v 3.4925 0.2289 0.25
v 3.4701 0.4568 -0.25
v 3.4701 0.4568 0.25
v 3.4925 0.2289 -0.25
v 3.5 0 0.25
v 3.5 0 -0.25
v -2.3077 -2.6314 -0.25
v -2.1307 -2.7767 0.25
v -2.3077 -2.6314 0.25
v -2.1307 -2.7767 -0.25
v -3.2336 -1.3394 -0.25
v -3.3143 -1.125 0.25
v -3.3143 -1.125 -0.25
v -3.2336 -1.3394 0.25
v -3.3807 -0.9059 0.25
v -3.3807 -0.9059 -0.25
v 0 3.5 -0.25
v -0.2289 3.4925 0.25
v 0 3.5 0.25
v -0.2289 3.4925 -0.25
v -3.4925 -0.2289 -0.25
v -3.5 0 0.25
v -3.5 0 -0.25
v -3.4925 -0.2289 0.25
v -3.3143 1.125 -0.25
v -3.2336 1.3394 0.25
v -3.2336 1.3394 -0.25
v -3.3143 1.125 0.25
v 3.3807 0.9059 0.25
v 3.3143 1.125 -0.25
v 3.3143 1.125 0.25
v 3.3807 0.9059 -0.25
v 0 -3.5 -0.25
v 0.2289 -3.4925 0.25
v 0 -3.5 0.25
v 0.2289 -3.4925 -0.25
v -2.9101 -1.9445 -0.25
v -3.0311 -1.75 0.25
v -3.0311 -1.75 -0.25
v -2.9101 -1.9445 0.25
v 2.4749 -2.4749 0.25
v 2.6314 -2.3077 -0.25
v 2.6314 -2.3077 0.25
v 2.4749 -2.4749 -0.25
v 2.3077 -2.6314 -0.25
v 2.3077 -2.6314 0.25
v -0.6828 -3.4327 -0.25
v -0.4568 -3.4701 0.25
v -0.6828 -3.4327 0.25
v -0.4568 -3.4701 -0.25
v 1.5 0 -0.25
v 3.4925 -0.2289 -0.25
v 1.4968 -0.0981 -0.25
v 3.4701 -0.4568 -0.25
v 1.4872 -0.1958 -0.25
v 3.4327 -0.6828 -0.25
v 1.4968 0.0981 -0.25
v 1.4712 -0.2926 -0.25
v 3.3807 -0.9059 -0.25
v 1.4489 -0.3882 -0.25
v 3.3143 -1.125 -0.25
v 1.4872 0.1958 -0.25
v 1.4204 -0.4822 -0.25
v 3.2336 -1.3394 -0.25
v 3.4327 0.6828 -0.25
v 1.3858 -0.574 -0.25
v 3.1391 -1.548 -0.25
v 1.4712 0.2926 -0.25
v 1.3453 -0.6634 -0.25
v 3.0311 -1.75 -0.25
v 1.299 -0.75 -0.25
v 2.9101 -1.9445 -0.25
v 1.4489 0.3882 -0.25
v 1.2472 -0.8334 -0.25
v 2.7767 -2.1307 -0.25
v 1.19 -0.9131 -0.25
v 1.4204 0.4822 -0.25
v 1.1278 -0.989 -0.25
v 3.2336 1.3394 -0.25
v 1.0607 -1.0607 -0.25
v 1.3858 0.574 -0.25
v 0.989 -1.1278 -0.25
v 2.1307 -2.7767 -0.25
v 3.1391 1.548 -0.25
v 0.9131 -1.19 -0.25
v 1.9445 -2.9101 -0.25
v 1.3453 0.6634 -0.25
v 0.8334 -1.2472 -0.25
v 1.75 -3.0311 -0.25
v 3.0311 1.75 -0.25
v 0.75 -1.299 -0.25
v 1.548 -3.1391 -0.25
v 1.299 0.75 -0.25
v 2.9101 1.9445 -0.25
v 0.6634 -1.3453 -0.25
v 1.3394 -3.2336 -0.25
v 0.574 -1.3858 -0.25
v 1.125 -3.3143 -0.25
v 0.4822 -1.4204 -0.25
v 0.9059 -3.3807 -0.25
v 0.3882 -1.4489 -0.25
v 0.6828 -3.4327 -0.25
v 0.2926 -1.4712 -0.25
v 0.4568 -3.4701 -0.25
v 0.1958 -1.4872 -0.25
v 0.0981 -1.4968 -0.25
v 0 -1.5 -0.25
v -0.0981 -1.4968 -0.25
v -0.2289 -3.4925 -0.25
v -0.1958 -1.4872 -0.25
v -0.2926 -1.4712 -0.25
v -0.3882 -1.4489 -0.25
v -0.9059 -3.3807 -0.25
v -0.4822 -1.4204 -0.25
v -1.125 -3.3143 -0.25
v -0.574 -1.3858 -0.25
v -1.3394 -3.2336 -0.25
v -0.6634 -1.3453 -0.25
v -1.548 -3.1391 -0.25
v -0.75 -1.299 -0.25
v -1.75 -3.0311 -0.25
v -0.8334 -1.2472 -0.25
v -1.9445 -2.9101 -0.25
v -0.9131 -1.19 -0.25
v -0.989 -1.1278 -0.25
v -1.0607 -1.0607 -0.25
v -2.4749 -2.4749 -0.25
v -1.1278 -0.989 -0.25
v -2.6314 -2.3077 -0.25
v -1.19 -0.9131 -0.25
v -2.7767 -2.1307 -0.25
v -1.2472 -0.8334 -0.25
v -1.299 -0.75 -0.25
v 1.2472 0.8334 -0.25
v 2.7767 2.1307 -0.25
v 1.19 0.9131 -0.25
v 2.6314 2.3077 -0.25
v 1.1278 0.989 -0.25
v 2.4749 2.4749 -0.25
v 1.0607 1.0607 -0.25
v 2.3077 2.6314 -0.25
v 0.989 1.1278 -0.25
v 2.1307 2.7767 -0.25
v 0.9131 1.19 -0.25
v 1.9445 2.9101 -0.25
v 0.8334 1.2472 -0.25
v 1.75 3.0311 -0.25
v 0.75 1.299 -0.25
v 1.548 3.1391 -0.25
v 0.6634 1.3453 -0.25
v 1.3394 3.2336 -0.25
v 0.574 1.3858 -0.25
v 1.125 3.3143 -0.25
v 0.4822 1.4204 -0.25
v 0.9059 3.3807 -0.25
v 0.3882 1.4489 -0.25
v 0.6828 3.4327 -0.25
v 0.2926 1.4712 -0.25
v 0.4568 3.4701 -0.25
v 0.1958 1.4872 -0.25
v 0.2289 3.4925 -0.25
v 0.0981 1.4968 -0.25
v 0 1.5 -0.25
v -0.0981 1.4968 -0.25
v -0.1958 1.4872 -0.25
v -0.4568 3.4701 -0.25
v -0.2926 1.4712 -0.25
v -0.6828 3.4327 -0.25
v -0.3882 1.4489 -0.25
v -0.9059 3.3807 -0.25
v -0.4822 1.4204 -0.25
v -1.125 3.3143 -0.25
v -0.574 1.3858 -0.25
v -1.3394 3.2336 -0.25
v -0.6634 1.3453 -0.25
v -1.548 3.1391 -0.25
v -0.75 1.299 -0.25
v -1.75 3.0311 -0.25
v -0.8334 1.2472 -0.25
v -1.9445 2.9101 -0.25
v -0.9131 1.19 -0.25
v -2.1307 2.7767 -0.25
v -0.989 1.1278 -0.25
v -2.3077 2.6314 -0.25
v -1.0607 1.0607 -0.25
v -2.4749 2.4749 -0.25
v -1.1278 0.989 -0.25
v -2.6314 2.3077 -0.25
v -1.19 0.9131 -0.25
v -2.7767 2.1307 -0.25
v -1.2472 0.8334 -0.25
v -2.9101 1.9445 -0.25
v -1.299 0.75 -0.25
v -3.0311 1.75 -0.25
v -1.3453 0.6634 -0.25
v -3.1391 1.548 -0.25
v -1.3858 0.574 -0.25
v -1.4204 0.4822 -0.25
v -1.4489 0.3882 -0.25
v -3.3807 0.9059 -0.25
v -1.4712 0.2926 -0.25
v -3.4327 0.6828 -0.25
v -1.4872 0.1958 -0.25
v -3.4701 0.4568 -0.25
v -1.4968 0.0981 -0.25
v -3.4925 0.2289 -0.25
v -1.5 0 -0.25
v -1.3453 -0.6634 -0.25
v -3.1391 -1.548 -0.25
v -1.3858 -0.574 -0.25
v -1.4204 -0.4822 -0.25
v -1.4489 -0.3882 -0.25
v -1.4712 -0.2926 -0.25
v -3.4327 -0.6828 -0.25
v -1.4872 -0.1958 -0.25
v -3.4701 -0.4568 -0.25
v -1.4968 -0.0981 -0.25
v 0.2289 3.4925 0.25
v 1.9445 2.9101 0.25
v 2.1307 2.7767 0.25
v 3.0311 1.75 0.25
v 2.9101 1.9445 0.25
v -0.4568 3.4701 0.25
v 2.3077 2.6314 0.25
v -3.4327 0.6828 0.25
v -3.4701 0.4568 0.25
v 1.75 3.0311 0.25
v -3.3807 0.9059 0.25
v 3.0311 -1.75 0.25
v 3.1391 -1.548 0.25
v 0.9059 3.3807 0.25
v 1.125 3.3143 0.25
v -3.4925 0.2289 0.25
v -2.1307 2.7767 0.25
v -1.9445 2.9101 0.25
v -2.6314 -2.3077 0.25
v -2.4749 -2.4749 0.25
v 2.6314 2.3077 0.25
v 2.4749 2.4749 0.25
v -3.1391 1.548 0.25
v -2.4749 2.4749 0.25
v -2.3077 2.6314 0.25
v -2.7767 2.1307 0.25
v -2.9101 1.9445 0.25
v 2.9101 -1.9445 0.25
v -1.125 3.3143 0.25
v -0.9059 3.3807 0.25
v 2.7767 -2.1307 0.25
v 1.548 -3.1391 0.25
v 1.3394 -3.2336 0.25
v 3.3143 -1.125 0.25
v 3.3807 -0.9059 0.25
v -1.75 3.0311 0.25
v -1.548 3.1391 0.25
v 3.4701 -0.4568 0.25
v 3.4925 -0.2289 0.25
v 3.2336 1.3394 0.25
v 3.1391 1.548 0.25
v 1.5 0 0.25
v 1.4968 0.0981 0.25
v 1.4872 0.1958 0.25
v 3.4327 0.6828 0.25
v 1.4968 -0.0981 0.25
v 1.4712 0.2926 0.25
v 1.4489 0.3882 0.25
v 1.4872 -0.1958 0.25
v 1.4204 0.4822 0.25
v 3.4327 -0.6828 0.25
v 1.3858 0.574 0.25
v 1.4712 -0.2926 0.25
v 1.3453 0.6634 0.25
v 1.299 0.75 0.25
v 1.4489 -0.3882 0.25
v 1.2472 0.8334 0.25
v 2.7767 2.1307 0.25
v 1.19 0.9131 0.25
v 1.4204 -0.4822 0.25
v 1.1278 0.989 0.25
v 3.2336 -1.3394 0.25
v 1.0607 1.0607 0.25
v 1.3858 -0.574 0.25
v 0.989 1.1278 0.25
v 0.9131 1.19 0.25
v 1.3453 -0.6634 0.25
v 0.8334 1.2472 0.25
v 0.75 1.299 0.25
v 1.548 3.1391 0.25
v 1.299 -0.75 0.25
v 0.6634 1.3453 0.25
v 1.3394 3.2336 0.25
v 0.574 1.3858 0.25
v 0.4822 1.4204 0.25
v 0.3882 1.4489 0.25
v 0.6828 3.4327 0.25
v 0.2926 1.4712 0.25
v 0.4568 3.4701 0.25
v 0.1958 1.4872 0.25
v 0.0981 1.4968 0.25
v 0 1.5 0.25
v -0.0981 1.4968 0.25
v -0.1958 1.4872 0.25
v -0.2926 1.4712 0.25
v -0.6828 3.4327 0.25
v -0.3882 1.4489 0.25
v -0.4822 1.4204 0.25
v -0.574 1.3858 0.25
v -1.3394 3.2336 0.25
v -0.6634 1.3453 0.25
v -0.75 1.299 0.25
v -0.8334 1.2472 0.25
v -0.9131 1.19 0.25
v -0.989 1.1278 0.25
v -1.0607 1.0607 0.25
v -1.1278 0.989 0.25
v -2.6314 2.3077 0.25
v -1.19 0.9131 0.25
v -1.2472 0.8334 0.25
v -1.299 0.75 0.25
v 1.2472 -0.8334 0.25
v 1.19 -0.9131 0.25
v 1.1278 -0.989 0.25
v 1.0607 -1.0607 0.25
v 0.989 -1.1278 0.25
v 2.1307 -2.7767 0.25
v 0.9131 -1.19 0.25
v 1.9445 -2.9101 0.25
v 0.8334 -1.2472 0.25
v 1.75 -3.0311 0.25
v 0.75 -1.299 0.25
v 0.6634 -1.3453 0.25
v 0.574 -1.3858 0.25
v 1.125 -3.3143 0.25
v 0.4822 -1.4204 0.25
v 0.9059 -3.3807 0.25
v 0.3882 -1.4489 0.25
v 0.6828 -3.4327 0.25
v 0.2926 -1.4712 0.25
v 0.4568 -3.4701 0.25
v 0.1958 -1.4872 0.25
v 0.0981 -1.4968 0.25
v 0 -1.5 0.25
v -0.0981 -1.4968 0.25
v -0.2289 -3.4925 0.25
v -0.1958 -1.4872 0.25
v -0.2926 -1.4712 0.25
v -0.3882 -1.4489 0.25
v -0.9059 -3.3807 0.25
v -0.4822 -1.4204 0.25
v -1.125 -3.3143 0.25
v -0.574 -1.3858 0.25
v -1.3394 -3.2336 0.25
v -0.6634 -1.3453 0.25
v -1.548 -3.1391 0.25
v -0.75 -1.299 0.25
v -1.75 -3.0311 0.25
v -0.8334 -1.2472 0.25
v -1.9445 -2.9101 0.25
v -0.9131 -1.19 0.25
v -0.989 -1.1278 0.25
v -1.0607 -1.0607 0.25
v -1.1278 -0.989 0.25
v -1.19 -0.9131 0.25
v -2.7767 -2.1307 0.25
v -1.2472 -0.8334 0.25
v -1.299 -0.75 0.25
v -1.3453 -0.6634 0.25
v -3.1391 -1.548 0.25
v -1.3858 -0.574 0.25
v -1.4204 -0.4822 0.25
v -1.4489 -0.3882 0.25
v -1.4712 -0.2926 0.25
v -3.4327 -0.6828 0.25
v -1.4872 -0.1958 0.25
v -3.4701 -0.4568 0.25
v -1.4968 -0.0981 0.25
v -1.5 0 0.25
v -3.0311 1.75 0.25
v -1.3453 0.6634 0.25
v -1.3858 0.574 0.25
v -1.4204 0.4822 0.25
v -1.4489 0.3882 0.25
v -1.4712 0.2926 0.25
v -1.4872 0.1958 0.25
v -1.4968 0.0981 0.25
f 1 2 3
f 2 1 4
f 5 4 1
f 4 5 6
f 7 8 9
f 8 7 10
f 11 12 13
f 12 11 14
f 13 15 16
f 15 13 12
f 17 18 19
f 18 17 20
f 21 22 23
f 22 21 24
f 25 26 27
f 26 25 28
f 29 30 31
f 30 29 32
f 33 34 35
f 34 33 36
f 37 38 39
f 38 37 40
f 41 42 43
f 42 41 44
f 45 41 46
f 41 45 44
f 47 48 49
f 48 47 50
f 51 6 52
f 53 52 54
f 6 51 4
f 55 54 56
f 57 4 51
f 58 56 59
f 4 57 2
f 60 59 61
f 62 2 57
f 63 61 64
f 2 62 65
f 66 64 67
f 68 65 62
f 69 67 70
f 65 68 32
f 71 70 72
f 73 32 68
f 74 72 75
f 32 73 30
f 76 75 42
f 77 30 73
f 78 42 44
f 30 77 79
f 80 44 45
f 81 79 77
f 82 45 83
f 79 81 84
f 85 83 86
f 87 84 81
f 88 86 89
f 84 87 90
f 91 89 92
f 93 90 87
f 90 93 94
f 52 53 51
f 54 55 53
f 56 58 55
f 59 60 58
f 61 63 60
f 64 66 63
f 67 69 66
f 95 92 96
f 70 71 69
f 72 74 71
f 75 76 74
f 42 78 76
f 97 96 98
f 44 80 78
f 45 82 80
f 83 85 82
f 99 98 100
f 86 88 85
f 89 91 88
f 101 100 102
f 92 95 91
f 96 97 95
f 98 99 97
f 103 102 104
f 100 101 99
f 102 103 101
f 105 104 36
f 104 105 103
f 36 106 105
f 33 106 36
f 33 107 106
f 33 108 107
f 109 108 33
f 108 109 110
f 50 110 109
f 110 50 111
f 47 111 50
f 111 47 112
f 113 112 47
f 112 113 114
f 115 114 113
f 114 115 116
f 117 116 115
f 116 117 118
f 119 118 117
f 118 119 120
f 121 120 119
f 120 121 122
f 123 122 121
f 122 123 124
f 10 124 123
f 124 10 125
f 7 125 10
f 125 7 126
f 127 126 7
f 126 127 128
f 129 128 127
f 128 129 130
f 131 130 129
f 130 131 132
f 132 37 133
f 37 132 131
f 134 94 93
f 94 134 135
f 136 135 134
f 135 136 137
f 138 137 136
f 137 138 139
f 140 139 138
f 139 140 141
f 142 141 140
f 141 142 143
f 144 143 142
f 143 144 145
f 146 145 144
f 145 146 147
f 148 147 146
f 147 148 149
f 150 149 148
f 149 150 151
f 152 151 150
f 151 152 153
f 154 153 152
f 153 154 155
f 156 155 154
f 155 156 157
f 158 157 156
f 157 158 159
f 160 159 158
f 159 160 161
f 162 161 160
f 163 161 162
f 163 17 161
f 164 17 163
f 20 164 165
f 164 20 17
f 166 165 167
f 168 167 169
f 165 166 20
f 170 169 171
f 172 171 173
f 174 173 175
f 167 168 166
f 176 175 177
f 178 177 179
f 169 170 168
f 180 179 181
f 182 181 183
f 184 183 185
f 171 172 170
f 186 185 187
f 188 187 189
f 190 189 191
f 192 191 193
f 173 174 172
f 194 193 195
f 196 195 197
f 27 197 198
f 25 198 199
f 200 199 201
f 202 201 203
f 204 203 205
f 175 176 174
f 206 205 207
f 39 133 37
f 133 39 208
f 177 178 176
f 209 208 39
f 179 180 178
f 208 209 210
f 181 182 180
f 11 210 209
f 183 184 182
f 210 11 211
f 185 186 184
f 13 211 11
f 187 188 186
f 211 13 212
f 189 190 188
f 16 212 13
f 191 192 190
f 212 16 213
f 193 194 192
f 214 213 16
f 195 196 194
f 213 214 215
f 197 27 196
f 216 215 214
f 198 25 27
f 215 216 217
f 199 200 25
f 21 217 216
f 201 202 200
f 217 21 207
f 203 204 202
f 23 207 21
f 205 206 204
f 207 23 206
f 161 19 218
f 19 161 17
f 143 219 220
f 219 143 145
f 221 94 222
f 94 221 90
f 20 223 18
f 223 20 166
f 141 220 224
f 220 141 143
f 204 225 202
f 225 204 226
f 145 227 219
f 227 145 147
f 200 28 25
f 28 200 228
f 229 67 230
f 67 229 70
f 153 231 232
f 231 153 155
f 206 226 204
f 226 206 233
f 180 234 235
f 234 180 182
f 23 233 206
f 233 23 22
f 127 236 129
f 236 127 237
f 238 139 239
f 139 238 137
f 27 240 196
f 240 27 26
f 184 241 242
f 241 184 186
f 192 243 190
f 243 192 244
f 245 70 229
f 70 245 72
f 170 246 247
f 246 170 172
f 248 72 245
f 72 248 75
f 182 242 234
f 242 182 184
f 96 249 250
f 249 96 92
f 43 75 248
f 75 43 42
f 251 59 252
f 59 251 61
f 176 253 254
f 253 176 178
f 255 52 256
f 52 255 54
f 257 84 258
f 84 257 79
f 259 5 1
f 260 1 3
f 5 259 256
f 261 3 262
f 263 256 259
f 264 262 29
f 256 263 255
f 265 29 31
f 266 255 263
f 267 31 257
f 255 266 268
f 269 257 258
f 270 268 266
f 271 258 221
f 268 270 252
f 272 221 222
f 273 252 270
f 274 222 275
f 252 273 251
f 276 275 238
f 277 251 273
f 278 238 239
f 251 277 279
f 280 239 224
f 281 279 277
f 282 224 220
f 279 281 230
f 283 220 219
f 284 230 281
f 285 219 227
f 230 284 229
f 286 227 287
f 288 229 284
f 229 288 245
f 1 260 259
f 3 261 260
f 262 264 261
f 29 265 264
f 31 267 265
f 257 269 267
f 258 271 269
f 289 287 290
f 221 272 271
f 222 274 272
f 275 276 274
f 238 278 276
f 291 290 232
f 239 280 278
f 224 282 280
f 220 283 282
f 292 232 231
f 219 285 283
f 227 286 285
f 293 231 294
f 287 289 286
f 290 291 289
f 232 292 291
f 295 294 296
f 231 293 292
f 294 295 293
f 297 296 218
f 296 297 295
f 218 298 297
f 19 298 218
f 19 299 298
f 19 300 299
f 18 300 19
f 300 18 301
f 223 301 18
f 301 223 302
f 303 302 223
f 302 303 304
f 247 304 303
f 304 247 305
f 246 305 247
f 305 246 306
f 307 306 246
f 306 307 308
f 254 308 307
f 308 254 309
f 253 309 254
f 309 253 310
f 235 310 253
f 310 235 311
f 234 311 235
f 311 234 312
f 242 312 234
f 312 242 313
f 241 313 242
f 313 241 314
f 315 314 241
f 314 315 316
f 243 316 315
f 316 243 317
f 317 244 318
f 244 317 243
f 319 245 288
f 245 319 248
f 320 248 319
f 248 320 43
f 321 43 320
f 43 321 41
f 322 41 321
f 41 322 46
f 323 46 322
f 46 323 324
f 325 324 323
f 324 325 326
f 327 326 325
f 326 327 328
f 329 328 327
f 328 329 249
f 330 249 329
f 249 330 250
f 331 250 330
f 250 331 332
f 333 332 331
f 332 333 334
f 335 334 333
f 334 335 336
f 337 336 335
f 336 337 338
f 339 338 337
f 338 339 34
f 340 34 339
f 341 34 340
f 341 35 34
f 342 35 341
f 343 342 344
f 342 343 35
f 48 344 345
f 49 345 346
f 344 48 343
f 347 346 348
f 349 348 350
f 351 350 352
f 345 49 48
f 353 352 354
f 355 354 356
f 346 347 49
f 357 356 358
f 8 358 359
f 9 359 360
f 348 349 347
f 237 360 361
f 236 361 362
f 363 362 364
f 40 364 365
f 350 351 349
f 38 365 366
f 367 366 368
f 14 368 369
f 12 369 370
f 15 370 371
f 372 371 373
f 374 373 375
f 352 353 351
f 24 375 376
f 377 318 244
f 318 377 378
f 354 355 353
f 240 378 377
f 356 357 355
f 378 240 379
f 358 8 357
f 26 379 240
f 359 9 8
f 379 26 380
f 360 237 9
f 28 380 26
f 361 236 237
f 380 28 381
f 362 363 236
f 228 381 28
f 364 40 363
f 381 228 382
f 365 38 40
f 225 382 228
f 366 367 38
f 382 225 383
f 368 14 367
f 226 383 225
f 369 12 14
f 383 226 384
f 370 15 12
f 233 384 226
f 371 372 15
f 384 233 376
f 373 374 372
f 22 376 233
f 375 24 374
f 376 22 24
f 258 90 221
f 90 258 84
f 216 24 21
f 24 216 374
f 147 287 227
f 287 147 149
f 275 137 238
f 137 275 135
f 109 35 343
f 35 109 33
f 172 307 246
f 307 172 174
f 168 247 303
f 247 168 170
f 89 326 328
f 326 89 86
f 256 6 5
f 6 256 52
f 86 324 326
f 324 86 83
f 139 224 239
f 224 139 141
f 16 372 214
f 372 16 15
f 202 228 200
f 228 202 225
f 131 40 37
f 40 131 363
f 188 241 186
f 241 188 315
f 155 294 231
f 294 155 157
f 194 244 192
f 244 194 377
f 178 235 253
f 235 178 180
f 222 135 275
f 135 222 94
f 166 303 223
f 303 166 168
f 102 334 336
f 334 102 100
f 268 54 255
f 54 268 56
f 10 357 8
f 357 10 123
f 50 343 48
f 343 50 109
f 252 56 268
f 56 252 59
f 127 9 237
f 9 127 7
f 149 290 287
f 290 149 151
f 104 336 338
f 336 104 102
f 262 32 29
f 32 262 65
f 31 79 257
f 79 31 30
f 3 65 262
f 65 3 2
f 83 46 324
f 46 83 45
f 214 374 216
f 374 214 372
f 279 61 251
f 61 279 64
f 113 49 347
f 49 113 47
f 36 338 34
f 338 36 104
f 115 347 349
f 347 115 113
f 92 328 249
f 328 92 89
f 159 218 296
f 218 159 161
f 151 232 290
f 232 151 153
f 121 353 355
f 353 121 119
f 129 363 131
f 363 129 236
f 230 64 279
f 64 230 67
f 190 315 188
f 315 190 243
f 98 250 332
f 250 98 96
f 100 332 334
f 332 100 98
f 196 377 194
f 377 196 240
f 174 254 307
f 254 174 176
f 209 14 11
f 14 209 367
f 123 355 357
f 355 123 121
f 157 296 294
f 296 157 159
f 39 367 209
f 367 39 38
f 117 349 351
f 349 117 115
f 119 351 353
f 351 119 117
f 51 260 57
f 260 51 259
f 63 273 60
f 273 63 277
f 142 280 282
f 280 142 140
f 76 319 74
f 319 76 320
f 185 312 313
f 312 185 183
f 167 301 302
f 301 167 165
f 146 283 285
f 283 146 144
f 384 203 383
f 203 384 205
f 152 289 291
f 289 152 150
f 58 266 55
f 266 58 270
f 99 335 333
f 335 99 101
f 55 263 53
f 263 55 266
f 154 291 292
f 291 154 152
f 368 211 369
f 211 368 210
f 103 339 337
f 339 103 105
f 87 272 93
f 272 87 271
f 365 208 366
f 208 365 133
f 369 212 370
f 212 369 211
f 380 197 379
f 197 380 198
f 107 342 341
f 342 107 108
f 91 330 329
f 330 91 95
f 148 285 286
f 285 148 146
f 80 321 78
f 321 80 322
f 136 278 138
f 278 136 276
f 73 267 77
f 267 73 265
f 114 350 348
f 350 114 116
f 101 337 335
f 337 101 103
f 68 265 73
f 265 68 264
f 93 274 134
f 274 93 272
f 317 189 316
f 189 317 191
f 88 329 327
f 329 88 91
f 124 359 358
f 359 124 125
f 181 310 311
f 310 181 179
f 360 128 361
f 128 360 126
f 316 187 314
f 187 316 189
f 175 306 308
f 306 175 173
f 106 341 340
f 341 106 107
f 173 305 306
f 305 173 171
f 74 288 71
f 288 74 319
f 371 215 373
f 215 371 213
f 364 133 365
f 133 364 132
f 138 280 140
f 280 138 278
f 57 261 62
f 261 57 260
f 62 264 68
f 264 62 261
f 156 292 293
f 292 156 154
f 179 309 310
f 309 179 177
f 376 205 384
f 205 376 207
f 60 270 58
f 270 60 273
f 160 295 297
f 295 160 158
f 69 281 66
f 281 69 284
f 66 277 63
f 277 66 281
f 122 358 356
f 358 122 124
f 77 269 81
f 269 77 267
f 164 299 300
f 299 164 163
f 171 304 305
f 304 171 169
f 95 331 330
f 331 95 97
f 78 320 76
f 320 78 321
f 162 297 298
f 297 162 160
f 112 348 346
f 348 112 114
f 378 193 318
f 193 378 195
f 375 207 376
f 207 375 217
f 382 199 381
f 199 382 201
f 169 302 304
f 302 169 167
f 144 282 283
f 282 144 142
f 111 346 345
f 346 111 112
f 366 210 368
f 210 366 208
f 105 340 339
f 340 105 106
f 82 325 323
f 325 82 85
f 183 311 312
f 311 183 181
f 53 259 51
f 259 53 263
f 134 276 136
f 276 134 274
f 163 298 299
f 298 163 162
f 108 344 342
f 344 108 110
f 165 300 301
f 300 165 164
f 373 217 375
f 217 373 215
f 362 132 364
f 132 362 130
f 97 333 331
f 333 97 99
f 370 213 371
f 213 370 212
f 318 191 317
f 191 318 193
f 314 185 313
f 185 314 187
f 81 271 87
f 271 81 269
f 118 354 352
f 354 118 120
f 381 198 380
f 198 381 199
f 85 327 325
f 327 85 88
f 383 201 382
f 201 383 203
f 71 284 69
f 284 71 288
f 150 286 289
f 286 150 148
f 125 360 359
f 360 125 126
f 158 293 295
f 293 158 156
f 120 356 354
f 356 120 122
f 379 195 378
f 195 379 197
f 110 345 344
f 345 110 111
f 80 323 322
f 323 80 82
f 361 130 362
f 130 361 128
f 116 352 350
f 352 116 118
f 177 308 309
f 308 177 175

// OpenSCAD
// Flat washer parameters (mm)
inner_diameter_mm = 3.0;  //[1.5:6.0:0.1]
outer_diameter_mm = 7.0;  //[3.5:14.0:0.1]
thickness_mm      = 0.5;  //[0.25:1.0:0.05]

// Small extra height to guarantee a clean through-hole cut
cut_extra_mm = 0.2;

module flat_washer(id_mm, od_mm, t_mm) {
    difference() {
        cylinder(d=od_mm, h=t_mm, center=true, $fn=96);
        cylinder(d=id_mm, h=t_mm + 2*cut_extra_mm, center=true, $fn=96);
    }
}

flat_washer(inner_diameter_mm, outer_diameter_mm, thickness_mm);
